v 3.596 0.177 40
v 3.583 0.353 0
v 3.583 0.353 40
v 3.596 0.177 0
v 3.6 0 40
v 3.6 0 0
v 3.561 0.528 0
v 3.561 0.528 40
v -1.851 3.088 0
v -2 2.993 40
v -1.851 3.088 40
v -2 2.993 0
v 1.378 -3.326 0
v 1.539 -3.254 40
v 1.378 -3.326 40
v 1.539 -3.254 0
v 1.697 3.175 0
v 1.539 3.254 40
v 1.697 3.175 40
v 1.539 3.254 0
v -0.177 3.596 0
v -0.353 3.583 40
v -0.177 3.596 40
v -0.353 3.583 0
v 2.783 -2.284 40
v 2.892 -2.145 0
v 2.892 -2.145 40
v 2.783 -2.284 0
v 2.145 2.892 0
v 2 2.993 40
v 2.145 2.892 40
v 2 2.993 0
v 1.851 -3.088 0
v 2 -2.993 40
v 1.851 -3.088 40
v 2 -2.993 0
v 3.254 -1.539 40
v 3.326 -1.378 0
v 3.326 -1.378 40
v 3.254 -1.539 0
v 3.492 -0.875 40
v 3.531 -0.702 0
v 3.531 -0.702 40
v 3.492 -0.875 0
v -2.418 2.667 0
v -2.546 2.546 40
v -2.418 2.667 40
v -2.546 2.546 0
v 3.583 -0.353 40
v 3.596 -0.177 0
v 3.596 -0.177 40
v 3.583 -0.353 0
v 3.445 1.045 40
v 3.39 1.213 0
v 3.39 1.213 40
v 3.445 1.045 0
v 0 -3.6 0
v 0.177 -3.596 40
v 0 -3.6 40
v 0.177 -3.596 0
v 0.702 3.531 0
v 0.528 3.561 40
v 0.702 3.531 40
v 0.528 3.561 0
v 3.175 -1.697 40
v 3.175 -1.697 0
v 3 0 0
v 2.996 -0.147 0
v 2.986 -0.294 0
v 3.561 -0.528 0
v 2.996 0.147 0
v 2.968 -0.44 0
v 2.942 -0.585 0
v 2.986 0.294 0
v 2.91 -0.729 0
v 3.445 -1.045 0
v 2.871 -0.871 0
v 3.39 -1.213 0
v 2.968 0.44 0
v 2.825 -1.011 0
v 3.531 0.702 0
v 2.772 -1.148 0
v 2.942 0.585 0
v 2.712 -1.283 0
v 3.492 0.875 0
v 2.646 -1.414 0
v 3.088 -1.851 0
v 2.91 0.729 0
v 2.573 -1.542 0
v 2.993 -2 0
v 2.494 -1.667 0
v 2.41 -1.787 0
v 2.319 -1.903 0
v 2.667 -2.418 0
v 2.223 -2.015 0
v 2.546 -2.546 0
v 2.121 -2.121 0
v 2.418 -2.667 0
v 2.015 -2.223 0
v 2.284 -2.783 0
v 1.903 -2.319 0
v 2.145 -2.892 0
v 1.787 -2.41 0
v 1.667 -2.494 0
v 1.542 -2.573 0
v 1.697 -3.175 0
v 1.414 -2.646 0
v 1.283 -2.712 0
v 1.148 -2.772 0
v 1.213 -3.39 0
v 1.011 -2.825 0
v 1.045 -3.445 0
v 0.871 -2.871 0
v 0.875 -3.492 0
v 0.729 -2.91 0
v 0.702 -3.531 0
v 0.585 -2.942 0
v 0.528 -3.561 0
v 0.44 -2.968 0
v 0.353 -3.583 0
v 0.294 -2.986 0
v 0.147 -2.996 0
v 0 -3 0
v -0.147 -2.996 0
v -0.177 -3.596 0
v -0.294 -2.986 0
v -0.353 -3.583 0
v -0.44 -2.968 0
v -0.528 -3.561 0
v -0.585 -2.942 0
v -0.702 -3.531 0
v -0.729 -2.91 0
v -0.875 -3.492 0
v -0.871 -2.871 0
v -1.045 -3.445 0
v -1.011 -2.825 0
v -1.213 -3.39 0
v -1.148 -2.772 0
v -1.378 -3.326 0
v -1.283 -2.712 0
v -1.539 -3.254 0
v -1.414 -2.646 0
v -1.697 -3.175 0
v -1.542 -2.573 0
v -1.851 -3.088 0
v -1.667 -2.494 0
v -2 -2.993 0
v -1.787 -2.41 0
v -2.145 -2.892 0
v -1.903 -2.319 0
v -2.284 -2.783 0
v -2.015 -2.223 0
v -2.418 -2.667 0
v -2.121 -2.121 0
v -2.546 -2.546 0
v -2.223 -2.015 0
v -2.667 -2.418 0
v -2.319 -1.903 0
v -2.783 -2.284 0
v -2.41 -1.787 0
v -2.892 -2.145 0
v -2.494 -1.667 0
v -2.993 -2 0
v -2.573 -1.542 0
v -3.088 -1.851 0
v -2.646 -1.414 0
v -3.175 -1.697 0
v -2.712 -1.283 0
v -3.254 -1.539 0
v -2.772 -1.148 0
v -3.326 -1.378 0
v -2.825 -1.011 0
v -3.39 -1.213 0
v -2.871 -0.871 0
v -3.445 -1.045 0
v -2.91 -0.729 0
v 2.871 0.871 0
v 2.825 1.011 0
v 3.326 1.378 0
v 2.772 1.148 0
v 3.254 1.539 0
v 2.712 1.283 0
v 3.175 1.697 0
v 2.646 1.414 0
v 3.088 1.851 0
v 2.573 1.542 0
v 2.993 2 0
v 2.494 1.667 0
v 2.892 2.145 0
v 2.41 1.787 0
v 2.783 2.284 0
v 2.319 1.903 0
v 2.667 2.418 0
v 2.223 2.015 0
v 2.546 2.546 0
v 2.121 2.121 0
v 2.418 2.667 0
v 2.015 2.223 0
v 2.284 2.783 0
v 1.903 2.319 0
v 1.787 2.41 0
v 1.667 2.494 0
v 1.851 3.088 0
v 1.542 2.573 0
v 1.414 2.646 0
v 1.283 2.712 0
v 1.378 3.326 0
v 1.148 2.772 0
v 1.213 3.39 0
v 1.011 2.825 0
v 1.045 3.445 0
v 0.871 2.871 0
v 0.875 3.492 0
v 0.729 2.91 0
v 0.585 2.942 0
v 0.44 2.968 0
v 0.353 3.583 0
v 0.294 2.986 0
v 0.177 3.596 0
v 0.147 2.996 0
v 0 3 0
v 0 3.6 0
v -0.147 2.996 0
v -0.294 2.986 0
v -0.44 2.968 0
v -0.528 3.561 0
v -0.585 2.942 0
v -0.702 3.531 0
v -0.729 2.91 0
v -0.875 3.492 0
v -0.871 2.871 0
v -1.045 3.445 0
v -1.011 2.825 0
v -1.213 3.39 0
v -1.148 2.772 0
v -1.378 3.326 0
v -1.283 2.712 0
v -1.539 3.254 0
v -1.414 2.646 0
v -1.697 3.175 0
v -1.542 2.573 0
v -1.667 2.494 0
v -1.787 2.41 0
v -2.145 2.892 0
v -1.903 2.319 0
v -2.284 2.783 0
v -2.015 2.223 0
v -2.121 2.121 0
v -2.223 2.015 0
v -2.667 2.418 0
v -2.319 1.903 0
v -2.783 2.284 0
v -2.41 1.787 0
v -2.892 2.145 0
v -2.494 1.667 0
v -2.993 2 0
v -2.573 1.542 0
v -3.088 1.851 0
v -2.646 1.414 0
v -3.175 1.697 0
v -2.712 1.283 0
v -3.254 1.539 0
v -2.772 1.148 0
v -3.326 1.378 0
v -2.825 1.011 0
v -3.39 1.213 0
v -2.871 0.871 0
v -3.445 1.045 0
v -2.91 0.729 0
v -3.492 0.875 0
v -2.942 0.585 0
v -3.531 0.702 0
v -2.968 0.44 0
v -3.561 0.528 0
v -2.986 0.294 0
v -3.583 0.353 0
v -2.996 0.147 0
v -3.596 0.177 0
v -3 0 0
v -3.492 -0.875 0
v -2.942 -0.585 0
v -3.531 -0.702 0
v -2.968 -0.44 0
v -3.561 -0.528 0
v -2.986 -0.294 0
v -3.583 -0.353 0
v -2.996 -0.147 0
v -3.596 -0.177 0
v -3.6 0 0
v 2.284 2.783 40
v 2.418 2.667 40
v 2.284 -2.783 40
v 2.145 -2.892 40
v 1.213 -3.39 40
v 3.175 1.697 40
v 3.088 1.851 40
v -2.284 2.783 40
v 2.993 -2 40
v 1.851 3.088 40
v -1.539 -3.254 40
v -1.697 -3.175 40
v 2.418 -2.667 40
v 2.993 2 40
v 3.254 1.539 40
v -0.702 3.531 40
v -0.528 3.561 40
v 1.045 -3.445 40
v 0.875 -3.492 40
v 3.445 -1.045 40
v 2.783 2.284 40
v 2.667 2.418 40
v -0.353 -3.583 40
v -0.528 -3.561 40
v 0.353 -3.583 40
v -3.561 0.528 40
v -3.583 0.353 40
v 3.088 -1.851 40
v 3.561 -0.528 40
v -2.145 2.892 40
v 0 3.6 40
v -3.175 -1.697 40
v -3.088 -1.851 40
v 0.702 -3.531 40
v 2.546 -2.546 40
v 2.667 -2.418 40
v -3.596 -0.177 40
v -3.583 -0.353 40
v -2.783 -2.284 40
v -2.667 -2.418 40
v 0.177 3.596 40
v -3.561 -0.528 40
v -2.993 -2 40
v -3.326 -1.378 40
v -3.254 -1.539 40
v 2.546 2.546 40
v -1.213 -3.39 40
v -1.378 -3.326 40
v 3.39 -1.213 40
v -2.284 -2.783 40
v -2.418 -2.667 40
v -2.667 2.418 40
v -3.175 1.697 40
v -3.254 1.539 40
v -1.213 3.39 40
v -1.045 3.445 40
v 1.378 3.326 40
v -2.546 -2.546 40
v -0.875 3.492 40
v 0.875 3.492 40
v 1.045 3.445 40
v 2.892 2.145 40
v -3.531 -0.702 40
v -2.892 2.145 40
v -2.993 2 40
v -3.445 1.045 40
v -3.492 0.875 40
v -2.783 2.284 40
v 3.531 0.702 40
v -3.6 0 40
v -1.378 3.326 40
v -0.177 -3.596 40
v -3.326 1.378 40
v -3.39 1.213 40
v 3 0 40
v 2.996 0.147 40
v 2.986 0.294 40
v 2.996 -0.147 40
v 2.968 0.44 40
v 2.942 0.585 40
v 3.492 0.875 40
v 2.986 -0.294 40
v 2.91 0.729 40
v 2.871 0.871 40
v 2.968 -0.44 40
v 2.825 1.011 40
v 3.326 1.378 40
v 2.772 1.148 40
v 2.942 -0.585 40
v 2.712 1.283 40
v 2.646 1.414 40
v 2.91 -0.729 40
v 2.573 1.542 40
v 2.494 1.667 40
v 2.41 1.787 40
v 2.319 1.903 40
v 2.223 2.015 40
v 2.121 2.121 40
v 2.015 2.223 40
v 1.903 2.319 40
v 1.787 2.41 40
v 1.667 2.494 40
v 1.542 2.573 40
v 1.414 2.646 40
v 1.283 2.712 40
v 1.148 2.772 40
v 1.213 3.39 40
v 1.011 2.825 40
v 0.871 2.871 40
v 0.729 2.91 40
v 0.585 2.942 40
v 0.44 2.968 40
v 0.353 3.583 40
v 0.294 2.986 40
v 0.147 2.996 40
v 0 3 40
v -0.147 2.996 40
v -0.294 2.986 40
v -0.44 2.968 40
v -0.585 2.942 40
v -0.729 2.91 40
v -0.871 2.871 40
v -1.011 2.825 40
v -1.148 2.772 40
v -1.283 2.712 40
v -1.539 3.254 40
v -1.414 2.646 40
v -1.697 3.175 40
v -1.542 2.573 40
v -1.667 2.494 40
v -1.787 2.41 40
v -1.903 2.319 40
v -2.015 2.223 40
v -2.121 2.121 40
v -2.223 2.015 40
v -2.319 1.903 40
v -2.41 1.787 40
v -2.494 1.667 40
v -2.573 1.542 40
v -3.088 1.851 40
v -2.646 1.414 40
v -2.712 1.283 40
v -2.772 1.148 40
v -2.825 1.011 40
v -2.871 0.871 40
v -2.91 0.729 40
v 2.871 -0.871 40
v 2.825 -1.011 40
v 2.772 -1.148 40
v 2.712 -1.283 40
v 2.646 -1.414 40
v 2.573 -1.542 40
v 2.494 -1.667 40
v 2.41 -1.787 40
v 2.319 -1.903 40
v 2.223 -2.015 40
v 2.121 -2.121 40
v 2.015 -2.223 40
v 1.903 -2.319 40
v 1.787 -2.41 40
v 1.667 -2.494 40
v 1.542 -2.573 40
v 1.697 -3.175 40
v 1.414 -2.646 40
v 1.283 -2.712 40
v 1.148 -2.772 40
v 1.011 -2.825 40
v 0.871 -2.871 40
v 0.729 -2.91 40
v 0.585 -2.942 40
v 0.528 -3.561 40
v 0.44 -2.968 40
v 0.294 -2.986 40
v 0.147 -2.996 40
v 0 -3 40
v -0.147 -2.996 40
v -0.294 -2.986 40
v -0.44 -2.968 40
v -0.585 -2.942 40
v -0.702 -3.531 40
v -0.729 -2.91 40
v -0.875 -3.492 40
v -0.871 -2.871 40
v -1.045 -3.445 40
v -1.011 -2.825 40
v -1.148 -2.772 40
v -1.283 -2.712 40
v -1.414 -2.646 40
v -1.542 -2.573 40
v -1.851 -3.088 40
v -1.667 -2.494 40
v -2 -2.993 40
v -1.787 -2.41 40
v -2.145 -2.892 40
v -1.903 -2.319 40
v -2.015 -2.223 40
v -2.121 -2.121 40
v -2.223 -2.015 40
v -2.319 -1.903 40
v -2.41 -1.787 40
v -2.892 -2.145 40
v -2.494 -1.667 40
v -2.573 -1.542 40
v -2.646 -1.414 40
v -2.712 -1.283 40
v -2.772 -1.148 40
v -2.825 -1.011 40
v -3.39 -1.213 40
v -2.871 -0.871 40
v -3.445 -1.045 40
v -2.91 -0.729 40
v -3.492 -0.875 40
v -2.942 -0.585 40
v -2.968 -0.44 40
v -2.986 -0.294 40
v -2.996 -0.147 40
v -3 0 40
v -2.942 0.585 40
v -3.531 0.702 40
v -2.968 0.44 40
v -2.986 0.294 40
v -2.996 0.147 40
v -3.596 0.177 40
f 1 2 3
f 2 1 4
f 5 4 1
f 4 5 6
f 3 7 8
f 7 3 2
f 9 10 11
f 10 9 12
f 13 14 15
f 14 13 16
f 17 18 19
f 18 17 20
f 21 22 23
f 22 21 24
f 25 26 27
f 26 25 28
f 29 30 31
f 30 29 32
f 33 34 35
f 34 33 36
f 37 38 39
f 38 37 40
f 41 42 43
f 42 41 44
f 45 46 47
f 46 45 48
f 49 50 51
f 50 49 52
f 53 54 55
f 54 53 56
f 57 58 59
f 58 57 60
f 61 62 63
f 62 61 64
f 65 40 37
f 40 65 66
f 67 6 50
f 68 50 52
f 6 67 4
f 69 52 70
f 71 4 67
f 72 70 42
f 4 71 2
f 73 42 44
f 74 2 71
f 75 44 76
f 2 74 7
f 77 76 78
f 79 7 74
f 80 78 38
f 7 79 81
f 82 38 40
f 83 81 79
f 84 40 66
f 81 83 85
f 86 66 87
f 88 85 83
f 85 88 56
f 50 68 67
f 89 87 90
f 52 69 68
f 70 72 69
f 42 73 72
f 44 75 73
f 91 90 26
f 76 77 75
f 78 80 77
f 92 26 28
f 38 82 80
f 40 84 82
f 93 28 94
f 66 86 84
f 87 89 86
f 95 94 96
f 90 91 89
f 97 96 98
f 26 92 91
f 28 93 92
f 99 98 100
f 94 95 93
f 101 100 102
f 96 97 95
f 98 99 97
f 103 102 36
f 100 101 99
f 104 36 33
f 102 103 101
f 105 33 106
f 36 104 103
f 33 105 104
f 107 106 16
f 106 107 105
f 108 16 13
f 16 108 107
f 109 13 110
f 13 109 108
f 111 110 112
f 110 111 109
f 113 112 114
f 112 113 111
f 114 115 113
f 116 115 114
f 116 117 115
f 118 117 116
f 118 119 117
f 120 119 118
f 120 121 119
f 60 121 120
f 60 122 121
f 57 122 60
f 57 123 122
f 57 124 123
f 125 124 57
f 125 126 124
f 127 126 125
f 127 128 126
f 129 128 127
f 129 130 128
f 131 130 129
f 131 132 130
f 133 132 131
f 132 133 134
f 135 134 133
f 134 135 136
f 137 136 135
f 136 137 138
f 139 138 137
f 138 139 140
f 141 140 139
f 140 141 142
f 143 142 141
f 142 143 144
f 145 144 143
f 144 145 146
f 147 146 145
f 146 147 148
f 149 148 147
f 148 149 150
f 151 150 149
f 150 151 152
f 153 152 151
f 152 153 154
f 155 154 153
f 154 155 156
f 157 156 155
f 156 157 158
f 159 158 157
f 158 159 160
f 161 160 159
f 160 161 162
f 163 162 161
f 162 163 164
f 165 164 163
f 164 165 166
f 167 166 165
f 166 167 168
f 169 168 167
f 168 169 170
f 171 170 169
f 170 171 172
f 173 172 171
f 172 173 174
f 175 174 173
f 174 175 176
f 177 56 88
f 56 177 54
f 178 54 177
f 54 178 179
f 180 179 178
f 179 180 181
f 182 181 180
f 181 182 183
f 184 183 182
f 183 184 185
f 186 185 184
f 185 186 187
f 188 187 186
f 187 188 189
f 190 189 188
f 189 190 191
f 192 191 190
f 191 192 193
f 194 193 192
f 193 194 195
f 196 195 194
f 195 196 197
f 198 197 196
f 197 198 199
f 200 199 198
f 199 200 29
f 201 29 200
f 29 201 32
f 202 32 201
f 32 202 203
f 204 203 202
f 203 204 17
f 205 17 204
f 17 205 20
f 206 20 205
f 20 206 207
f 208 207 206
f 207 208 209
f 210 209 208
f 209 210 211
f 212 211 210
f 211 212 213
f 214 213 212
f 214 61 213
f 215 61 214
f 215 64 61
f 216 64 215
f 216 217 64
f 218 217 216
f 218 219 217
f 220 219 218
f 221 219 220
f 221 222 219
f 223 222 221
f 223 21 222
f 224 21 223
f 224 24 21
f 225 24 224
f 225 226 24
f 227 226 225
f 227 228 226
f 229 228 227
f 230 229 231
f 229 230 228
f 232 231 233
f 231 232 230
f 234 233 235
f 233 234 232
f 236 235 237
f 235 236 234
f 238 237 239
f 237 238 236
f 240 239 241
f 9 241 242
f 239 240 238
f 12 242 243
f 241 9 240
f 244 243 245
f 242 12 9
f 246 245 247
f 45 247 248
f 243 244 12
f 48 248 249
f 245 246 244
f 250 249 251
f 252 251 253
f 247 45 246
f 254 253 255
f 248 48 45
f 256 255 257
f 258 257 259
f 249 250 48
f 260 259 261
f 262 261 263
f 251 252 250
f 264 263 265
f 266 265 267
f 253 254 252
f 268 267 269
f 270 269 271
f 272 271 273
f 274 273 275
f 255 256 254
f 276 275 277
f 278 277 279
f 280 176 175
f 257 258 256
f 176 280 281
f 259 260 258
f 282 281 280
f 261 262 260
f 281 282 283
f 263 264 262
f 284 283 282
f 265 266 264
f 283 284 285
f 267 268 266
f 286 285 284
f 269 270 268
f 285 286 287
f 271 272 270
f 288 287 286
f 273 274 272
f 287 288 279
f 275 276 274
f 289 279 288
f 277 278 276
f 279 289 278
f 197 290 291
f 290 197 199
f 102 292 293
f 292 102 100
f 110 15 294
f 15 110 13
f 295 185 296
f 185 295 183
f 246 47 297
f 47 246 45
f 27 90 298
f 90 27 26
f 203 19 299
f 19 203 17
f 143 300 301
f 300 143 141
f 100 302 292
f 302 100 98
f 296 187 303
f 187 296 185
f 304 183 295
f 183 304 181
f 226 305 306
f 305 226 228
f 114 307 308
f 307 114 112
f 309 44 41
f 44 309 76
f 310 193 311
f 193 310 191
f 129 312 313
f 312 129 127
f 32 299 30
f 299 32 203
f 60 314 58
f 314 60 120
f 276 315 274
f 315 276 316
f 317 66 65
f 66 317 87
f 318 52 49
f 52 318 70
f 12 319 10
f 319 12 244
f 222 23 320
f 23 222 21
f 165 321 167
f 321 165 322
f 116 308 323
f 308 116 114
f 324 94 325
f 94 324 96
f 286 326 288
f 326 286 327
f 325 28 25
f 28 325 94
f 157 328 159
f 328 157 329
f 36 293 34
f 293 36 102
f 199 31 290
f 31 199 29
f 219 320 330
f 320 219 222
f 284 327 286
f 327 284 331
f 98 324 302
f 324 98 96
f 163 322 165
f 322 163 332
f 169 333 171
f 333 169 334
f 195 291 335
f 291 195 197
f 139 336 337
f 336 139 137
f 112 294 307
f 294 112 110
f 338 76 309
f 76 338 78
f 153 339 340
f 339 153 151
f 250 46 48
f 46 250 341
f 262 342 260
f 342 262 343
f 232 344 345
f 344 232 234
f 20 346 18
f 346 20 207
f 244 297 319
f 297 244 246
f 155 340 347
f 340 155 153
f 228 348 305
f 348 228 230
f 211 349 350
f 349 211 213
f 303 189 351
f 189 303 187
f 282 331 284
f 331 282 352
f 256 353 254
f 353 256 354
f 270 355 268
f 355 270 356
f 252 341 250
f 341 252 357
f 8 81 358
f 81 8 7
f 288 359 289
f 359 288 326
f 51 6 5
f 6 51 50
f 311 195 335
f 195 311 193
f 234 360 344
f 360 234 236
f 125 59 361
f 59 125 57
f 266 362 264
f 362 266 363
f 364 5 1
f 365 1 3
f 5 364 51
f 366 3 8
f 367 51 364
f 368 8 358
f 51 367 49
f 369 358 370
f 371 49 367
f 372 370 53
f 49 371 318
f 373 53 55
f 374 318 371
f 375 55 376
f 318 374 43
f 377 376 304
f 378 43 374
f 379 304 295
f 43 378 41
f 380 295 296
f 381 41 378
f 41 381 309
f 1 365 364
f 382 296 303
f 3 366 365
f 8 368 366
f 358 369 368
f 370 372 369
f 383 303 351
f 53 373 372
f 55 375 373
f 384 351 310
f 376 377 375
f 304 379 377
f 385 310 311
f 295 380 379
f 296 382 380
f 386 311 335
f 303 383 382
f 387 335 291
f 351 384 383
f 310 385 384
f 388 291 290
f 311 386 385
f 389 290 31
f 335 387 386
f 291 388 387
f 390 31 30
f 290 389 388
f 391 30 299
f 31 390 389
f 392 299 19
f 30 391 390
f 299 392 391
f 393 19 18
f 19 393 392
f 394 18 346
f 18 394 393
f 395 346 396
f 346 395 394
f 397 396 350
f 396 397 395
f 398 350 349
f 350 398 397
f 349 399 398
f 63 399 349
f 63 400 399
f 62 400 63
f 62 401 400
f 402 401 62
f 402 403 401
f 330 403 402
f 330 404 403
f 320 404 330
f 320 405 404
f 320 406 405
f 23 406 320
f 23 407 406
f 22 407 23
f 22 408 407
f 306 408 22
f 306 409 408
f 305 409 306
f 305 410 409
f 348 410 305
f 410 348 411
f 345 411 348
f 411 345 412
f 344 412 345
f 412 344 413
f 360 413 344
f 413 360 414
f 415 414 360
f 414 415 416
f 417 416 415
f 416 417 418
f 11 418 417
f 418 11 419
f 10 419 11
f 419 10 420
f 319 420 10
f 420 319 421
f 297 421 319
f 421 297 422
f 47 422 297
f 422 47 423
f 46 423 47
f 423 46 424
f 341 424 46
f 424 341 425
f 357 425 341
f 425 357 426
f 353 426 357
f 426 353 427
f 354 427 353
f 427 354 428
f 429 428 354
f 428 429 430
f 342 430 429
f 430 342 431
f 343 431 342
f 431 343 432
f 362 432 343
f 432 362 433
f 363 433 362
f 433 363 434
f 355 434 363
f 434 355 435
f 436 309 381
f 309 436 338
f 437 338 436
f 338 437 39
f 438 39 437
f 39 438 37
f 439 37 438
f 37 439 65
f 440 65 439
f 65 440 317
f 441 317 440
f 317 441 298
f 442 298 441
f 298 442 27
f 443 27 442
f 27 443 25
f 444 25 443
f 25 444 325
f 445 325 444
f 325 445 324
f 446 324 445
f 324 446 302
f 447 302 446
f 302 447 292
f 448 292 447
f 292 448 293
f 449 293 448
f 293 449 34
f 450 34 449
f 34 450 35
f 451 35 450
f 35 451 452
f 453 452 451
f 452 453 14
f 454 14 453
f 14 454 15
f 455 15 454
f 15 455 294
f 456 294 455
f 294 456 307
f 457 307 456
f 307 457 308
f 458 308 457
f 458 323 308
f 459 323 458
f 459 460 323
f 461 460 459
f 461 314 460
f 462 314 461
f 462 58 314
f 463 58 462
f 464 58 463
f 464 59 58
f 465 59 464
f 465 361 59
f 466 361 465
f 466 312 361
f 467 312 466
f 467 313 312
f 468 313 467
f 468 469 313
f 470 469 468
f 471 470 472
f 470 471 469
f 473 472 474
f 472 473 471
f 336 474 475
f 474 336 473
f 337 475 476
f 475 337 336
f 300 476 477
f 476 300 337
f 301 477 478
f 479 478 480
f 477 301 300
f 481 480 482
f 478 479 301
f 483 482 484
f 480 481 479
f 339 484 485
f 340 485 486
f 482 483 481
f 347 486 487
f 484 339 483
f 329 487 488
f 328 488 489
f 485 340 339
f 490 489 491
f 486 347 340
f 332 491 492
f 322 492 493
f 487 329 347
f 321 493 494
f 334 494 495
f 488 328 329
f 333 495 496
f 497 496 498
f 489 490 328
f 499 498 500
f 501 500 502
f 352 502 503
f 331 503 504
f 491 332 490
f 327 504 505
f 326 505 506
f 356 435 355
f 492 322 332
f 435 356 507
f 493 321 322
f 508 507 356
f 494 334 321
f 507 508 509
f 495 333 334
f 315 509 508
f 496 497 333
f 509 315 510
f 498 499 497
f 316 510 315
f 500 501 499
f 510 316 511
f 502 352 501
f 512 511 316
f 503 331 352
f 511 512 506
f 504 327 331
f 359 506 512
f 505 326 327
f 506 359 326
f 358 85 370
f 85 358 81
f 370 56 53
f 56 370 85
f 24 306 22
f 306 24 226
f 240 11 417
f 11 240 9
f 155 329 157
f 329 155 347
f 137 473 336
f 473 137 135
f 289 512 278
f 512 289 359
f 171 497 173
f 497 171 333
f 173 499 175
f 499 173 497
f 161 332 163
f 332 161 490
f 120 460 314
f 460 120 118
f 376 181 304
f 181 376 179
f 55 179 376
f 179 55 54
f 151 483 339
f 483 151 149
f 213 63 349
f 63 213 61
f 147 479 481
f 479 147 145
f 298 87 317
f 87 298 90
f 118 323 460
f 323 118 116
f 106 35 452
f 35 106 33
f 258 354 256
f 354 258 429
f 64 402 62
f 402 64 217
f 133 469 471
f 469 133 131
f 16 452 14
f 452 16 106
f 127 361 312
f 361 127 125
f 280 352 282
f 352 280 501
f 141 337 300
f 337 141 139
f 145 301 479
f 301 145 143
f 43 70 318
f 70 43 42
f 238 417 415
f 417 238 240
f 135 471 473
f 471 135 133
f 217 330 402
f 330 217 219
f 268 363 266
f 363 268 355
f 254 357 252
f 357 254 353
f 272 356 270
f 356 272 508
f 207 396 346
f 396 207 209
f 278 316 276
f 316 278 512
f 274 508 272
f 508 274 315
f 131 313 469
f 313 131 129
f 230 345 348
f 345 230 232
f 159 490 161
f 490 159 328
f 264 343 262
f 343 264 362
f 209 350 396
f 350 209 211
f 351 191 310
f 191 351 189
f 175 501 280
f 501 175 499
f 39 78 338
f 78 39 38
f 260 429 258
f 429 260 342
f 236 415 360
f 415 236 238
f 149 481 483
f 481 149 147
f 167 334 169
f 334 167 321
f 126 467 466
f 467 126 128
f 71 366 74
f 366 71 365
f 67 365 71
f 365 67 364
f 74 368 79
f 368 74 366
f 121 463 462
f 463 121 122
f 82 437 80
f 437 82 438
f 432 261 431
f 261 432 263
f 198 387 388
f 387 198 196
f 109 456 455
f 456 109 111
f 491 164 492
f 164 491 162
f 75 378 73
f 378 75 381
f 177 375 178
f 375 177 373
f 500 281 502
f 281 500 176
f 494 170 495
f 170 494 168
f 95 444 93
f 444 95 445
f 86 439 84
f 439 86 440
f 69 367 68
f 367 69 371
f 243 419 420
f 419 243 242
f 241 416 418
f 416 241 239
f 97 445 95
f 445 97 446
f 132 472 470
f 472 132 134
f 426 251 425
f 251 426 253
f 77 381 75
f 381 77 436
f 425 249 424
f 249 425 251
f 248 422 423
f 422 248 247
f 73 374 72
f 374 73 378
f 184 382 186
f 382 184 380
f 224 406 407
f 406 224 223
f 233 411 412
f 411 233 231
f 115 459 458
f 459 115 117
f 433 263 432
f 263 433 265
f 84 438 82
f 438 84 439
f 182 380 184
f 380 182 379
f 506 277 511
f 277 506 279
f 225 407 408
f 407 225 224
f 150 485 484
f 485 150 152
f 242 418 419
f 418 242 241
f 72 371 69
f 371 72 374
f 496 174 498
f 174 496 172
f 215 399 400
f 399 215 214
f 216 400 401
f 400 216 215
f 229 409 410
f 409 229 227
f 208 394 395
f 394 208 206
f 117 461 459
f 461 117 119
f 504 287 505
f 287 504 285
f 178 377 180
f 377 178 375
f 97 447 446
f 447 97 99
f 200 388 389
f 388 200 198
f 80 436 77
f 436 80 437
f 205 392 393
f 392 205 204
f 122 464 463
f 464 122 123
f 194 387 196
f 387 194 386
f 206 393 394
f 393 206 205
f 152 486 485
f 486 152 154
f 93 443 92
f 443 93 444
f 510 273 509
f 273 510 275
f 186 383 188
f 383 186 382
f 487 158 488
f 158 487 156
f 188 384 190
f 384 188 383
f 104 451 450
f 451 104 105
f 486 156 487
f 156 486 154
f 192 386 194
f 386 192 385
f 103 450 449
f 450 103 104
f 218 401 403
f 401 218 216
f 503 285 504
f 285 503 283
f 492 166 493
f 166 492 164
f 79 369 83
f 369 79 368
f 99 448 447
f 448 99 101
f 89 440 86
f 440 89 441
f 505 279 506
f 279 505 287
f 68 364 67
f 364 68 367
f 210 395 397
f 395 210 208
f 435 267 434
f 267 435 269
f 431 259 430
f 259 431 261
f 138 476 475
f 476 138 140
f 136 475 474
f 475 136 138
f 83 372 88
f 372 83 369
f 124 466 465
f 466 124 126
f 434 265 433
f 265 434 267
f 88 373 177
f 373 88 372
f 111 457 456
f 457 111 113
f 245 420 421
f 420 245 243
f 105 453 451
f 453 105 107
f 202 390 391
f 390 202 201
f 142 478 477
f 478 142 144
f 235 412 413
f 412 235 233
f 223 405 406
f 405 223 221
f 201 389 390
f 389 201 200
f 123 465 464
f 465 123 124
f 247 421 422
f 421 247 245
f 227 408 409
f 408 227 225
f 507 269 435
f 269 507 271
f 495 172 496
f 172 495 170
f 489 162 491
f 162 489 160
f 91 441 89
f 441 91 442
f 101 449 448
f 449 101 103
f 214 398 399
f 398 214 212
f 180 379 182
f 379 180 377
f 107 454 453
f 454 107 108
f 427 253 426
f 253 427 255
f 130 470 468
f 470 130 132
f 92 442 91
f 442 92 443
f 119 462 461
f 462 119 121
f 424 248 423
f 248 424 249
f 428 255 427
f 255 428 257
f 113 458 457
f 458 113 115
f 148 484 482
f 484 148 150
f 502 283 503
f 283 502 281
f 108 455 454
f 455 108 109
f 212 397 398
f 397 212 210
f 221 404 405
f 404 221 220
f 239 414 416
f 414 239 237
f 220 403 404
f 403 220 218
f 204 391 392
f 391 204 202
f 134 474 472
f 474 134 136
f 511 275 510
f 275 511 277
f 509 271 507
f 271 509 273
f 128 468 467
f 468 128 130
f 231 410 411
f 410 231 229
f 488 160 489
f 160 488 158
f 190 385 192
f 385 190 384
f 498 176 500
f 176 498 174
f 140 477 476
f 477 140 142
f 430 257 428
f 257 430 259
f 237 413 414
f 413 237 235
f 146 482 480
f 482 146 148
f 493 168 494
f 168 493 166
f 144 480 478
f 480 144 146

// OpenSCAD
$fn = 128;

// Heatshrink sleeving (tubing)
inner_d = 6;          // mm
wall_thickness = 0.6; // mm
length = 40;          // mm

outer_d = inner_d + 2 * wall_thickness;

difference() {
  cylinder(h = length, d = outer_d, center = false);
  translate([0, 0, -0.5])
    cylinder(h = length + 1, d = inner_d, center = false);
}
